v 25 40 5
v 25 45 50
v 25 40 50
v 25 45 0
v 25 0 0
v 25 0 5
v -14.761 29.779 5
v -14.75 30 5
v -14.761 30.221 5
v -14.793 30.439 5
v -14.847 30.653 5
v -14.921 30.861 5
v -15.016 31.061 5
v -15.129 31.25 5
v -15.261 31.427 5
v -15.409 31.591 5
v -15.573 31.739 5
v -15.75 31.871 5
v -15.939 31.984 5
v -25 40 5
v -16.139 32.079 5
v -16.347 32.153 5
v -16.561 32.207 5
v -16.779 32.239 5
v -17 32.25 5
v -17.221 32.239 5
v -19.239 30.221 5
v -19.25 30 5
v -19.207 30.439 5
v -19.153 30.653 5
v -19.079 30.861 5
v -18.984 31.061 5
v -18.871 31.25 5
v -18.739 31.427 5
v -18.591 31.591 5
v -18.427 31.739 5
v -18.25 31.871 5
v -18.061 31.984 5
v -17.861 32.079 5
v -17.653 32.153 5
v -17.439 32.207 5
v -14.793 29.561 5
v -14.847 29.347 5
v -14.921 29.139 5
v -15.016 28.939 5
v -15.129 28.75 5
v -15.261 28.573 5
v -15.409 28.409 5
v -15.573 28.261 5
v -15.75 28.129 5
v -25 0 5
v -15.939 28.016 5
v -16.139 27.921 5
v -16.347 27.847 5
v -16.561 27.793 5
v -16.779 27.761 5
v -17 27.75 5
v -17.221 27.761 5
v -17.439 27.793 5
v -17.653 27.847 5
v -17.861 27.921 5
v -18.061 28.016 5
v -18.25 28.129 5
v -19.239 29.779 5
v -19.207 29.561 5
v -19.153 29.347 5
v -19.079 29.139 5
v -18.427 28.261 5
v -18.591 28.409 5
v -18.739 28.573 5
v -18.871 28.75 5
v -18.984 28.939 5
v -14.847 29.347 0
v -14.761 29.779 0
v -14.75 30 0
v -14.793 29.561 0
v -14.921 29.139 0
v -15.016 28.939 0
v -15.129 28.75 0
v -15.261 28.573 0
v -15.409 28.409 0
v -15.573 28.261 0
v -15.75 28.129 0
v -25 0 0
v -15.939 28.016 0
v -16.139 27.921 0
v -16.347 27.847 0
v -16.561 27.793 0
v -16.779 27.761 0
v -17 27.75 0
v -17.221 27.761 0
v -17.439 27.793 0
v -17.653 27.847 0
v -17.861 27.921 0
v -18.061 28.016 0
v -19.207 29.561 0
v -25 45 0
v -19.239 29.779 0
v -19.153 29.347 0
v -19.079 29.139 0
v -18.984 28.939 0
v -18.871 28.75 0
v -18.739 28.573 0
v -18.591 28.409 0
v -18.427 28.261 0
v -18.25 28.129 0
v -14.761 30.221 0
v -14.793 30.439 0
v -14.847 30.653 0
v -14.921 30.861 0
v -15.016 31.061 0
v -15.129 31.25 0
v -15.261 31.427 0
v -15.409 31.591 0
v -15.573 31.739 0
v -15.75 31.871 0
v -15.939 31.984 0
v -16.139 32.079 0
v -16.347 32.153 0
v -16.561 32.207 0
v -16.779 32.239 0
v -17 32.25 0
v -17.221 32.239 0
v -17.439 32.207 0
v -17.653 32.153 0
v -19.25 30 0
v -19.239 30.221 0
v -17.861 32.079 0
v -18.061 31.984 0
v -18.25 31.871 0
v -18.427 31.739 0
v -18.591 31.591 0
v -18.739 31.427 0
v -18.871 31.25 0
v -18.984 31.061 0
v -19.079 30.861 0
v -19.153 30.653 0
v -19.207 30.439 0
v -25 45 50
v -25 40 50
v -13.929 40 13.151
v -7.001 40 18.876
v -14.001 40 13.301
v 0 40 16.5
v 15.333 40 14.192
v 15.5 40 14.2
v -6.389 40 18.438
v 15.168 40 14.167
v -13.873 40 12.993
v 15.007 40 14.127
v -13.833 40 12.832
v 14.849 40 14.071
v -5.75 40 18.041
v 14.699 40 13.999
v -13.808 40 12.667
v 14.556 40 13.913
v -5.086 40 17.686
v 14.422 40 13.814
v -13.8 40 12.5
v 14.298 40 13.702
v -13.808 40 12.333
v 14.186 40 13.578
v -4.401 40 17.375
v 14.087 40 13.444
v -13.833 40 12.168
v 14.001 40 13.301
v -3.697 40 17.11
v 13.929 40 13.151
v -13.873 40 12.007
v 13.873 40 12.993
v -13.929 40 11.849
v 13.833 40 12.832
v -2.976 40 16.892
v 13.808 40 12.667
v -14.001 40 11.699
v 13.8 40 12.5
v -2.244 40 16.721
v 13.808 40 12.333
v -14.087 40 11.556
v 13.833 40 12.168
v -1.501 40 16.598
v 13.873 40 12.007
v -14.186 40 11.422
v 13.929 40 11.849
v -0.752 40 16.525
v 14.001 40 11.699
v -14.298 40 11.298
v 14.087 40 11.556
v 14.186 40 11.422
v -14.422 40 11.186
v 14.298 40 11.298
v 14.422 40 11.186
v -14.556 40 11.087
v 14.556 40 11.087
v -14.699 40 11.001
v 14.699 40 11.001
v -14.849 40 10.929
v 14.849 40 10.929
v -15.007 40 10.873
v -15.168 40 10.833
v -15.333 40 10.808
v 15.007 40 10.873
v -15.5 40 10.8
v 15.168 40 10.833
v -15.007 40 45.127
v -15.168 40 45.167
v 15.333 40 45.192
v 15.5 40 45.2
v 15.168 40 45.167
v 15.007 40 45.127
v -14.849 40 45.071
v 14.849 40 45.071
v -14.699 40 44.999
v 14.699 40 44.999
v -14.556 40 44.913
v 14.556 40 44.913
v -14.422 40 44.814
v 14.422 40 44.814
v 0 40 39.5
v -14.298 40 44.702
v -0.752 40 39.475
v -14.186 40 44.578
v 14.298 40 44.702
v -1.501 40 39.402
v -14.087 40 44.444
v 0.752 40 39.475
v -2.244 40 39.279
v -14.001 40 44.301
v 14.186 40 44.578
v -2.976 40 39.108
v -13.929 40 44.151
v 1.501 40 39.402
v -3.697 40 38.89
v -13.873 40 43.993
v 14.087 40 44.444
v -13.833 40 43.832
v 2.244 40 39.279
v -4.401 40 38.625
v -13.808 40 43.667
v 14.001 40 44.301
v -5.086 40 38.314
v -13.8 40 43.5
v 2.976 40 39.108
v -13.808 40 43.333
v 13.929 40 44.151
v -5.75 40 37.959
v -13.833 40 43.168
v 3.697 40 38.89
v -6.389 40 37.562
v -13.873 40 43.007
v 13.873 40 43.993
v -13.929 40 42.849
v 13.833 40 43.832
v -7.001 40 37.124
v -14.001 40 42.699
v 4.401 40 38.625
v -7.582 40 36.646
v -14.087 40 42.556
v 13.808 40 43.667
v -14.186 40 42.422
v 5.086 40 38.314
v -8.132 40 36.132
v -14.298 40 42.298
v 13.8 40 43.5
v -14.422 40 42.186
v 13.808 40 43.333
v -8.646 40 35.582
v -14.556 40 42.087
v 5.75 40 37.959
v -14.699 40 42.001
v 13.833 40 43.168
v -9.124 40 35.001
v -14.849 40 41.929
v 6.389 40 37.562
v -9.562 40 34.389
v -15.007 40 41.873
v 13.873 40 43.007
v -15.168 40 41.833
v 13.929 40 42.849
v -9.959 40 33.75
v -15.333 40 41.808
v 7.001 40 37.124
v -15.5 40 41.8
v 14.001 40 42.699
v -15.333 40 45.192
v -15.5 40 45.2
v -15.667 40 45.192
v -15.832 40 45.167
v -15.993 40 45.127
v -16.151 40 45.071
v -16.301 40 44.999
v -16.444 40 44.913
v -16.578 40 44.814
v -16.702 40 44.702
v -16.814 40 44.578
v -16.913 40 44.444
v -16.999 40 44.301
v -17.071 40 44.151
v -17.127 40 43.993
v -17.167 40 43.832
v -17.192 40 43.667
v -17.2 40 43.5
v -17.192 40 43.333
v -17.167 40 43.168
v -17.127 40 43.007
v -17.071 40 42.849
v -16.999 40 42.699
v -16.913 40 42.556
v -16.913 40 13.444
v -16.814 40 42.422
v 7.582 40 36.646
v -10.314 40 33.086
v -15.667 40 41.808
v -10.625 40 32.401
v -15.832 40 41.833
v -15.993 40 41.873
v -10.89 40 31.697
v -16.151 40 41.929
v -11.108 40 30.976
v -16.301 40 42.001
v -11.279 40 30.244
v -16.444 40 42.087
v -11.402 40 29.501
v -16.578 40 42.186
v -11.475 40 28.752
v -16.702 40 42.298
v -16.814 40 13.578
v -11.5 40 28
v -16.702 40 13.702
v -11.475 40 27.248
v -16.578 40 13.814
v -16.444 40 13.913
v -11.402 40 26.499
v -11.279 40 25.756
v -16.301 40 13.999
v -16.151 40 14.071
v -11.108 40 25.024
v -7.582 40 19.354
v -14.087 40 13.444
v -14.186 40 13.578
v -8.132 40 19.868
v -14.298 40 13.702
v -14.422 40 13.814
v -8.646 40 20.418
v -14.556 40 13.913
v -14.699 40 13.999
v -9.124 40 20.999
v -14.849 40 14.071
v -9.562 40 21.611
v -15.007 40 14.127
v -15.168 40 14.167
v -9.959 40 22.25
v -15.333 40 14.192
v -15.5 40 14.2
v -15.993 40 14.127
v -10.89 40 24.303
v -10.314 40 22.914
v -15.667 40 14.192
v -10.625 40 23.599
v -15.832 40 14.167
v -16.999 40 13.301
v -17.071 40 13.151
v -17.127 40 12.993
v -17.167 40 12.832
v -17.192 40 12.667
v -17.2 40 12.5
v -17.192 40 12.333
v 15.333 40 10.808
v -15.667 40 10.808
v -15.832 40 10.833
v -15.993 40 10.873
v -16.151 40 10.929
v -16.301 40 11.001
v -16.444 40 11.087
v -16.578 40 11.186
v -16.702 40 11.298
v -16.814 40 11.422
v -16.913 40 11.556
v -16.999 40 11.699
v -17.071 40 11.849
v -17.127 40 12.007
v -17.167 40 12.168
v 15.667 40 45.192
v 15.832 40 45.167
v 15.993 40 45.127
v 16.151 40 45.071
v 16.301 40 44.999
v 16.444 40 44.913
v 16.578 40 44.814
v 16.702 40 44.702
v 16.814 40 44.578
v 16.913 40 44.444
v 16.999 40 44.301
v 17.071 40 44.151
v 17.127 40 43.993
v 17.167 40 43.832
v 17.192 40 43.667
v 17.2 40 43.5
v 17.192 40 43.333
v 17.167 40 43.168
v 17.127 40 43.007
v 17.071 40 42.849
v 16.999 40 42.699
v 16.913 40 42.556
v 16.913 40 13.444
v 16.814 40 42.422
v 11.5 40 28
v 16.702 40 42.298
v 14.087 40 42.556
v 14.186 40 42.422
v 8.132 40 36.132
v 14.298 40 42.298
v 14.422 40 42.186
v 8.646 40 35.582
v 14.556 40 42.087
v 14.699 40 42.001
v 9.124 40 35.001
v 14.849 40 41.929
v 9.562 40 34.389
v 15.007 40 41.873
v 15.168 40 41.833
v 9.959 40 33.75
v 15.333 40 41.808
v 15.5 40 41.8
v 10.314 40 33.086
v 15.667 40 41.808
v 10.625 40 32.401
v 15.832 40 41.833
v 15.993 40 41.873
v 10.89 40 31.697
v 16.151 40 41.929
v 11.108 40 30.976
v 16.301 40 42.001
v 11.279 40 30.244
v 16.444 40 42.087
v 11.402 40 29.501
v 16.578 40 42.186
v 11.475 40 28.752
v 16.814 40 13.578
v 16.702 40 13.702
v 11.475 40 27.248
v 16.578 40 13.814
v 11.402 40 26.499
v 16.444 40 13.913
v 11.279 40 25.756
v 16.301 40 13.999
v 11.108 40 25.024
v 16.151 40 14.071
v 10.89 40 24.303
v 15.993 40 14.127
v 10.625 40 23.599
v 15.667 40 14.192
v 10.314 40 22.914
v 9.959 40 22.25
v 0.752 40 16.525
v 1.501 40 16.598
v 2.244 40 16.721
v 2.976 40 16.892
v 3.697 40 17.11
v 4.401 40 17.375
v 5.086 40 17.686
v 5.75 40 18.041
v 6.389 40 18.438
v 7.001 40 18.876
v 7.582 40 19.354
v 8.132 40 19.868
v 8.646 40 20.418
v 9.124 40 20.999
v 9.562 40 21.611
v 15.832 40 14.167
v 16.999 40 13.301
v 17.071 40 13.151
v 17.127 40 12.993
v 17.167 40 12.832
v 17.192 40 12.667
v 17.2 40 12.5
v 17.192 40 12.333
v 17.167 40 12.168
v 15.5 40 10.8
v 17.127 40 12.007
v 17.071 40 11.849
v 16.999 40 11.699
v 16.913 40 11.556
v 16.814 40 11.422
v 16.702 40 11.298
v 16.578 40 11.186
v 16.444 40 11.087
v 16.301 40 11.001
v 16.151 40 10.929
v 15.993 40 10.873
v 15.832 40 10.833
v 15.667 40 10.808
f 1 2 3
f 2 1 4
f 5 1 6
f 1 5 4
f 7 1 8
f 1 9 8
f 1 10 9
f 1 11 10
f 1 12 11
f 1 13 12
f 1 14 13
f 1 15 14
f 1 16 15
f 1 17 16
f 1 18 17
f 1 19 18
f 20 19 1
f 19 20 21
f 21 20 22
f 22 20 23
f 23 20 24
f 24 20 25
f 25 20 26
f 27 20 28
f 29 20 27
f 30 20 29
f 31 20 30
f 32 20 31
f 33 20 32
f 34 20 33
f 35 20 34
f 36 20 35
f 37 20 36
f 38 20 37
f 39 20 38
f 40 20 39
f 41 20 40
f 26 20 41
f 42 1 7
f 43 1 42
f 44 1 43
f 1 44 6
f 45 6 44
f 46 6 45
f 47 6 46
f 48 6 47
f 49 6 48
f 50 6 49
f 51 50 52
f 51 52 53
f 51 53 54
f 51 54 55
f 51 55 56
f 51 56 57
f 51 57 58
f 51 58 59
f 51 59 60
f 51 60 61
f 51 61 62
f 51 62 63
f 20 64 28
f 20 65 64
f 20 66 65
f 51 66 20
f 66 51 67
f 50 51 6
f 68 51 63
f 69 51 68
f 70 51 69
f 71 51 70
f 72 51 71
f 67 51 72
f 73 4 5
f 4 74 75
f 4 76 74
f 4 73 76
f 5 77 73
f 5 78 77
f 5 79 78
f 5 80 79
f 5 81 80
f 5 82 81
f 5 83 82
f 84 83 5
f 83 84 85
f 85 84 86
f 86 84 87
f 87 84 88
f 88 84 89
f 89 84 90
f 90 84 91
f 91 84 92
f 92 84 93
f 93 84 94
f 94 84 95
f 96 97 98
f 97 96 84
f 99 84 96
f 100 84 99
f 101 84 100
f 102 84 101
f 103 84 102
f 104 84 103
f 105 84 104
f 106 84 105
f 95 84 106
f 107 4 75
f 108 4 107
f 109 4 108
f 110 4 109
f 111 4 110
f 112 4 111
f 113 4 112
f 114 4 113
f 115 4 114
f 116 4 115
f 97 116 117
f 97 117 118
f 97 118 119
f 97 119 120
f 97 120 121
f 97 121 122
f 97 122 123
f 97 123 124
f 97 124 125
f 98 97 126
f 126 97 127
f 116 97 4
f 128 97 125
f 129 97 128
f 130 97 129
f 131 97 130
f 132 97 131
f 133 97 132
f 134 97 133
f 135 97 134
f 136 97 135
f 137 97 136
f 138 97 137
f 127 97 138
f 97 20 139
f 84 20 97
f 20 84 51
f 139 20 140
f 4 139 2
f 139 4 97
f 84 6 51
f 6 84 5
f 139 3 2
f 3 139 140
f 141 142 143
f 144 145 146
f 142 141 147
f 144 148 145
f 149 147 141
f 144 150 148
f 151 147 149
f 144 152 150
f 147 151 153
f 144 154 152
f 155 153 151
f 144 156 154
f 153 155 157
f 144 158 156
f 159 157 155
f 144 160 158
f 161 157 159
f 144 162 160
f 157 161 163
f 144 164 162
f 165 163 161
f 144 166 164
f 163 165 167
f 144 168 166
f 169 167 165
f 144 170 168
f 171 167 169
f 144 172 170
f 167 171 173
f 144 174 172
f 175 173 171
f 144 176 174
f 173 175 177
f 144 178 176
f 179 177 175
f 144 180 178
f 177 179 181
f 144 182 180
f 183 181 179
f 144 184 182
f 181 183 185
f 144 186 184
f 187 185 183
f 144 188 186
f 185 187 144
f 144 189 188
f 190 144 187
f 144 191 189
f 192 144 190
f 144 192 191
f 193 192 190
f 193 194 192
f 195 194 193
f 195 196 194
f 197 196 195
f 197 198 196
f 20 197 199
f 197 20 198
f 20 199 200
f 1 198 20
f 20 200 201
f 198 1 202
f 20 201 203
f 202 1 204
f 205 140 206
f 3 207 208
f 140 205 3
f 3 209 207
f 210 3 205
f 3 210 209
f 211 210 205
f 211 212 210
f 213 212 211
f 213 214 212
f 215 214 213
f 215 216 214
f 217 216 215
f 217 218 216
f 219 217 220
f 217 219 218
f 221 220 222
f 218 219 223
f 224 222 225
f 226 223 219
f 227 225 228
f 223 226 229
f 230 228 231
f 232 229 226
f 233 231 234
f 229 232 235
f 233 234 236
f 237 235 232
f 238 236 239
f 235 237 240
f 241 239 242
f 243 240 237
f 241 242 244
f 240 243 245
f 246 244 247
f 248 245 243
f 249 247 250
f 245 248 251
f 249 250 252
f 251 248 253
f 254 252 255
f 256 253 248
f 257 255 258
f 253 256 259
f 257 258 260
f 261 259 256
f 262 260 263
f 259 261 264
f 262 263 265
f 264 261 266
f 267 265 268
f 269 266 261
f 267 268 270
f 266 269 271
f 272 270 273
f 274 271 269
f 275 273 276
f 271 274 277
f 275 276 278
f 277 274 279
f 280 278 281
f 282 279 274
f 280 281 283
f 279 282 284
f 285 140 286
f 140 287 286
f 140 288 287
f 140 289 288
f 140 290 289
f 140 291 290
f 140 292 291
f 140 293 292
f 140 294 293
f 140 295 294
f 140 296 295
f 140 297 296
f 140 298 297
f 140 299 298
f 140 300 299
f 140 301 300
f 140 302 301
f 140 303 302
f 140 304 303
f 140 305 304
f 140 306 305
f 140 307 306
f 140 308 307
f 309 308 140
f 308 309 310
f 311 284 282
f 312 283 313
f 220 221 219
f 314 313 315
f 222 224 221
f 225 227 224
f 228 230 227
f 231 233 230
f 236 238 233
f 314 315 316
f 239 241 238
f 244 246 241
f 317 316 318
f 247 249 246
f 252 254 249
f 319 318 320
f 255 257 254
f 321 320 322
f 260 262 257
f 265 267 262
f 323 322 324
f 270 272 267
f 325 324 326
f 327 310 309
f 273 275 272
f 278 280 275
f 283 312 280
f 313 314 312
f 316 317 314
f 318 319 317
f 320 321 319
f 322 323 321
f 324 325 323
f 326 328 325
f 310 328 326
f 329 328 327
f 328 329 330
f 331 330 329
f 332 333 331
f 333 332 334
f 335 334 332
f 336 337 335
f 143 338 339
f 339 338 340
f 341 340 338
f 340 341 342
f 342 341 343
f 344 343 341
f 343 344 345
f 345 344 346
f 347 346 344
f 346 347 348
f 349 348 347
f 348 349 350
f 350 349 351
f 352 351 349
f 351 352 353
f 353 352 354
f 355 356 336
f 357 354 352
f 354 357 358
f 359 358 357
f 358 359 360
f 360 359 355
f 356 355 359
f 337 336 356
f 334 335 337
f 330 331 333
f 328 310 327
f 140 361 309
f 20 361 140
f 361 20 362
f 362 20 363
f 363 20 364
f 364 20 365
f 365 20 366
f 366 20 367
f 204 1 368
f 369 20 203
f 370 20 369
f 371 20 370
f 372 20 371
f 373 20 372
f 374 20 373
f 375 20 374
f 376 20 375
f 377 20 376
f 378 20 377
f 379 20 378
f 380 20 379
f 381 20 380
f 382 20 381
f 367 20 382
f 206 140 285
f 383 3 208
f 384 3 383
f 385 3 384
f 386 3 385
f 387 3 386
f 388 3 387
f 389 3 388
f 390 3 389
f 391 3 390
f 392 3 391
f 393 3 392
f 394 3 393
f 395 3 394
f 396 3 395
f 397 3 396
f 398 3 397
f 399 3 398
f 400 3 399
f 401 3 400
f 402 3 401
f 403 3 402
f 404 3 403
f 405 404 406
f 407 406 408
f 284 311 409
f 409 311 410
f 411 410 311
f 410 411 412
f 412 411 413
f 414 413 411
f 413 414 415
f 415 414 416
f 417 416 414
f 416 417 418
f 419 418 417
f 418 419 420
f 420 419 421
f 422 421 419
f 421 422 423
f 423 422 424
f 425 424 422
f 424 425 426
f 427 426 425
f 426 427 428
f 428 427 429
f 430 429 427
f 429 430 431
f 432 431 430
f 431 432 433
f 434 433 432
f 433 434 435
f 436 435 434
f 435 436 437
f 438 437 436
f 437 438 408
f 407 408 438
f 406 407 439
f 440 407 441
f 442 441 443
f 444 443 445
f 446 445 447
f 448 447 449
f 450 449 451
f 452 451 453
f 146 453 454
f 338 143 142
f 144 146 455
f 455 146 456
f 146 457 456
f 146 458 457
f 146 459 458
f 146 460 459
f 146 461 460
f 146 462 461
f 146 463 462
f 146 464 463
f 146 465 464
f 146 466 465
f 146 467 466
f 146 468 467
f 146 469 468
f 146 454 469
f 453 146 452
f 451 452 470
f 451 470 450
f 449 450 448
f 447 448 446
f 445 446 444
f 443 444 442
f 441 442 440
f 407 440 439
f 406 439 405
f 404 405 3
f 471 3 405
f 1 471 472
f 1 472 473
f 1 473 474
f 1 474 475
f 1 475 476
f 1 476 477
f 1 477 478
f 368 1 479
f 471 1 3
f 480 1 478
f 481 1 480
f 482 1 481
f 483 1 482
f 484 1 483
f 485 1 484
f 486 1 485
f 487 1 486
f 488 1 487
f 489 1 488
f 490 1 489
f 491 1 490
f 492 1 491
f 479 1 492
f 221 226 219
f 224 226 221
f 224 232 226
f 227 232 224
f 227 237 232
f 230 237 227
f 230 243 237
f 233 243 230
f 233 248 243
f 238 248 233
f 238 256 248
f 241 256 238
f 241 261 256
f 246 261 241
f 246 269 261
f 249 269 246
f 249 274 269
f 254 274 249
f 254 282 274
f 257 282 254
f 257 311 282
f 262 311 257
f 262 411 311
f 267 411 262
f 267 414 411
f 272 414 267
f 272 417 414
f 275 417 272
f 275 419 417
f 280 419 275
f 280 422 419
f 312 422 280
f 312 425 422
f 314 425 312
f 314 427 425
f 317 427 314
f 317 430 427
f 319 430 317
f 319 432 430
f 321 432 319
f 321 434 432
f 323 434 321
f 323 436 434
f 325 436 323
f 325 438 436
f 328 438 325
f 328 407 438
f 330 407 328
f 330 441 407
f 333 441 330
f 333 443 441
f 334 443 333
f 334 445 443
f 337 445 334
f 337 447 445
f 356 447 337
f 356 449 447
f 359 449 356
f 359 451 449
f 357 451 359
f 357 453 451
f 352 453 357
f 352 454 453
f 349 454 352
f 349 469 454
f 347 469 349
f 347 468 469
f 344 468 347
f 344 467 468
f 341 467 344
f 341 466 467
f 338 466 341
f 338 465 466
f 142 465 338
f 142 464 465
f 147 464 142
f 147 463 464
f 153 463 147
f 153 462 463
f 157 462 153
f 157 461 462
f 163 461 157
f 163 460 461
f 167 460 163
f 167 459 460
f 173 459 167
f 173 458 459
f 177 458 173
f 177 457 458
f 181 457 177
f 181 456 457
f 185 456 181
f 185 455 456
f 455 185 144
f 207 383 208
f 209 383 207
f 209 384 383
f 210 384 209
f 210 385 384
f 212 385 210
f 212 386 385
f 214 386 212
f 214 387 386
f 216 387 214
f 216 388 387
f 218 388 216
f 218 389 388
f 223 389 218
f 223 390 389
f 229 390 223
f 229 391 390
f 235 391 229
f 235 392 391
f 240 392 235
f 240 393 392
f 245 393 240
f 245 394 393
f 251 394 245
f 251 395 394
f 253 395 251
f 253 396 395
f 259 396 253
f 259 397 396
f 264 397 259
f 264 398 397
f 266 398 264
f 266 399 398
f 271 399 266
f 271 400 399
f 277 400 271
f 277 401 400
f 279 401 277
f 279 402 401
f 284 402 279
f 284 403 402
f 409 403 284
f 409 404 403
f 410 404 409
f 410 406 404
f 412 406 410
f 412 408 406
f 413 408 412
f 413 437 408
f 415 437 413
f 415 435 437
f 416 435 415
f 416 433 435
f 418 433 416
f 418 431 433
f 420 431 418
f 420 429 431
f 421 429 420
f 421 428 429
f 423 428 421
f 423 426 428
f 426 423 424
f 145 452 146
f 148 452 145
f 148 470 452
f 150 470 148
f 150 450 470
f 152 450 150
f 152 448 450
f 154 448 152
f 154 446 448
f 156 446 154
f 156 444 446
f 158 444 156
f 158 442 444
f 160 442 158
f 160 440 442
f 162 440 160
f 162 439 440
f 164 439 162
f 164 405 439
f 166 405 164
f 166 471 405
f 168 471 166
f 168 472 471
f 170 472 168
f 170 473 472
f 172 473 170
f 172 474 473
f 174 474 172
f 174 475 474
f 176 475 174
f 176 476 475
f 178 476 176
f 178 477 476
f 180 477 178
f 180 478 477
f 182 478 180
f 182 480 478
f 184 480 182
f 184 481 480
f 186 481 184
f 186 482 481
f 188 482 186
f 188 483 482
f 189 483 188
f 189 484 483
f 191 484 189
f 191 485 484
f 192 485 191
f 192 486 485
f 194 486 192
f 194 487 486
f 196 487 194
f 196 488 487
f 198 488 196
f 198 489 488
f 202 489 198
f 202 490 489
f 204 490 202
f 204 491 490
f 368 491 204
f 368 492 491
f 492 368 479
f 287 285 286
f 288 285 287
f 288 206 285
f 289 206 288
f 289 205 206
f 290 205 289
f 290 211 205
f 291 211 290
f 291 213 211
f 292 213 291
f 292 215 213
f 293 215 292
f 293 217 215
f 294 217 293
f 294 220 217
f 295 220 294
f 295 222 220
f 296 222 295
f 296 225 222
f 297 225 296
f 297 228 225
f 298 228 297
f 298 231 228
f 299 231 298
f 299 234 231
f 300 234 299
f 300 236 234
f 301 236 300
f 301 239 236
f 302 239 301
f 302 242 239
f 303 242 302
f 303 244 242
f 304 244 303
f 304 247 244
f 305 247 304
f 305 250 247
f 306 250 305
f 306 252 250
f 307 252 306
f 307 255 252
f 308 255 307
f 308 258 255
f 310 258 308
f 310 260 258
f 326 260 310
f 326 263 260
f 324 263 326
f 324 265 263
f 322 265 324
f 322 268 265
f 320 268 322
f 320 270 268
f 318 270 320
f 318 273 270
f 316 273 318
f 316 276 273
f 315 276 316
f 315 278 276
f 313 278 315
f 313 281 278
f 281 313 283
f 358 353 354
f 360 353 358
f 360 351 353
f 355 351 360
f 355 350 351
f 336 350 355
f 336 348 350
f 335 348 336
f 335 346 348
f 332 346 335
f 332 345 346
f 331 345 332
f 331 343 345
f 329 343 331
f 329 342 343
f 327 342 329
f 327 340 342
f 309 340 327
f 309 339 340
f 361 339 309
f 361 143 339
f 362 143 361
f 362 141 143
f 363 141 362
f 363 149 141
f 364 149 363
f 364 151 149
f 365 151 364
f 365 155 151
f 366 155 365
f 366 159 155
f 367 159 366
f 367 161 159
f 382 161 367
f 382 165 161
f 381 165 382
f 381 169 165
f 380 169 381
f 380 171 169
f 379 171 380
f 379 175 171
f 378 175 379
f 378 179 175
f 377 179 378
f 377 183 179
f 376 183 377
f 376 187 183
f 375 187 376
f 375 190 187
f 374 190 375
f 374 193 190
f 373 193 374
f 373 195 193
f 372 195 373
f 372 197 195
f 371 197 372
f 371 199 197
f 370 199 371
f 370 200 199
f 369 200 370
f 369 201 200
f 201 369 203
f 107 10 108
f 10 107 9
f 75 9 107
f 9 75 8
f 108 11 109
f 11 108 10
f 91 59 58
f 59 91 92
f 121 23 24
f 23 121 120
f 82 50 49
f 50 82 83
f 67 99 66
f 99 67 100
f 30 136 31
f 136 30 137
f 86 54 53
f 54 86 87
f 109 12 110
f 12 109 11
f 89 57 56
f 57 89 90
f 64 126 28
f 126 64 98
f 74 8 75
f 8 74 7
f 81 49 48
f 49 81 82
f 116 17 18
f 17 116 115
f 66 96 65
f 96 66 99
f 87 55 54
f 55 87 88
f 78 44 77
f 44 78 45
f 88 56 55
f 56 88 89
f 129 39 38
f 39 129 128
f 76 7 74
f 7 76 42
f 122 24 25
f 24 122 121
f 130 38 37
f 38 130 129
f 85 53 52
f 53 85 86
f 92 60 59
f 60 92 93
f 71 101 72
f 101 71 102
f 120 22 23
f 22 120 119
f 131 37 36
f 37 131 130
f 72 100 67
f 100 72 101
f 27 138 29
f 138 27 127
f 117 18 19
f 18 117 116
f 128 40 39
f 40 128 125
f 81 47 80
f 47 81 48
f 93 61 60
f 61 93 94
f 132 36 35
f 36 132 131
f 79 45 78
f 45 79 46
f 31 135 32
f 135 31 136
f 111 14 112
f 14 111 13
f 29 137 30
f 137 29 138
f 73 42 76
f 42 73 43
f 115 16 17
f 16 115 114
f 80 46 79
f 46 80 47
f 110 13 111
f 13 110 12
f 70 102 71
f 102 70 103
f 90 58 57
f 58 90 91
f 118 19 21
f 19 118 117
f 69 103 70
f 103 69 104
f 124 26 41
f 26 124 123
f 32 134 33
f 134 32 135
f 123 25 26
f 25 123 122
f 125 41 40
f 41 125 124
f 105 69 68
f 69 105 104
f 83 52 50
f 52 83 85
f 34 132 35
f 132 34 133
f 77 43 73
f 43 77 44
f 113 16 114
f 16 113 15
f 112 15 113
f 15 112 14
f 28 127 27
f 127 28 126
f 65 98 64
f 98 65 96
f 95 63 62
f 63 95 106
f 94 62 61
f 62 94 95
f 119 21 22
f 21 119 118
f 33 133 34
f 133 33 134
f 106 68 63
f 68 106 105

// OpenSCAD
// L-shaped mounting bracket for NEMA 17 stepper motor
// Print orientation: base plate on bed, motor plate builds upward (+Z)

// ---------------- Parameters ----------------
plate_x       = 25;    // base plate half-width (X)
plate_y       = 45;    // base plate length (Y)
plate_t       = 5;     // base plate thickness (Z)

motor_h       = 50;    // motor plate height (Z)
motor_w       = 5;     // motor plate thickness (Y)

boss_d        = 23;    // motor boss hole diameter
boss_x        = 0;     // boss hole centre X
boss_z        = 28;    // boss hole centre Z

screw_d       = 3.4;   // M3 screw hole diameter
screw_pattern = 31;    // square pitch of screw holes
screw_count   = 4;     // number of screw holes

gusset_t      = 5;     // gusset thickness (X)
gusset_leg    = 20;    // right-triangle leg length (Y and Z)
gusset_x      = [-25, -20, 20, 25]; // gusset X positions (flush edges)

eps           = 0.5;   // cutter overshoot past faces
$fn           = 96;    // curve resolution

// ---------------- Model ----------------
difference() {
    union() {
        // Base plate
        translate([-plate_x, 0, 0])
            cube([plate_x * 2, plate_y, plate_t]);

        // Vertical motor plate
        translate([-plate_x, plate_y - motor_w, 0])
            cube([plate_x * 2, motor_w, motor_h]);
    }

    // Base plate through-holes (M4)
    for (h = [plate_t + eps, motor_h - eps])
        translate([-17, 30, 0])
            cylinder(d = 4.5, h = h, $fn = 64);

    // Motor boss hole (along Y) and screw holes (square pattern)
    translate([boss_x, plate_y - motor_w, boss_z])
        rotate([90, 0, 0]) {
            cylinder(d = boss_d, h = motor_w + 2 * eps, $fn = 96);
            for (i = [0 : screw_count - 1])
                for (j = [0 : screw_count - 1])
                    translate([(i - (screw_count - 1) / 2) * screw_pattern,
                               (j - (screw_count - 1) / 2) * screw_pattern,
                               0])
                        cylinder(d = screw_d, h = motor_w + 2 * eps, $fn = 64);
        }

    // Triangular gussets, flush with left and right edges
    for (gx = gusset_x)
        translate([gx, plate_y - gusset_leg, gusset_leg])
            rotate([90, 0, 0])
                linear_extrude(height = gusset_t)
                    polygon(points = [
                        [0, 0],
                        [gusset_leg, 0],
                        [0, gusset_leg]
                    ]);
}
